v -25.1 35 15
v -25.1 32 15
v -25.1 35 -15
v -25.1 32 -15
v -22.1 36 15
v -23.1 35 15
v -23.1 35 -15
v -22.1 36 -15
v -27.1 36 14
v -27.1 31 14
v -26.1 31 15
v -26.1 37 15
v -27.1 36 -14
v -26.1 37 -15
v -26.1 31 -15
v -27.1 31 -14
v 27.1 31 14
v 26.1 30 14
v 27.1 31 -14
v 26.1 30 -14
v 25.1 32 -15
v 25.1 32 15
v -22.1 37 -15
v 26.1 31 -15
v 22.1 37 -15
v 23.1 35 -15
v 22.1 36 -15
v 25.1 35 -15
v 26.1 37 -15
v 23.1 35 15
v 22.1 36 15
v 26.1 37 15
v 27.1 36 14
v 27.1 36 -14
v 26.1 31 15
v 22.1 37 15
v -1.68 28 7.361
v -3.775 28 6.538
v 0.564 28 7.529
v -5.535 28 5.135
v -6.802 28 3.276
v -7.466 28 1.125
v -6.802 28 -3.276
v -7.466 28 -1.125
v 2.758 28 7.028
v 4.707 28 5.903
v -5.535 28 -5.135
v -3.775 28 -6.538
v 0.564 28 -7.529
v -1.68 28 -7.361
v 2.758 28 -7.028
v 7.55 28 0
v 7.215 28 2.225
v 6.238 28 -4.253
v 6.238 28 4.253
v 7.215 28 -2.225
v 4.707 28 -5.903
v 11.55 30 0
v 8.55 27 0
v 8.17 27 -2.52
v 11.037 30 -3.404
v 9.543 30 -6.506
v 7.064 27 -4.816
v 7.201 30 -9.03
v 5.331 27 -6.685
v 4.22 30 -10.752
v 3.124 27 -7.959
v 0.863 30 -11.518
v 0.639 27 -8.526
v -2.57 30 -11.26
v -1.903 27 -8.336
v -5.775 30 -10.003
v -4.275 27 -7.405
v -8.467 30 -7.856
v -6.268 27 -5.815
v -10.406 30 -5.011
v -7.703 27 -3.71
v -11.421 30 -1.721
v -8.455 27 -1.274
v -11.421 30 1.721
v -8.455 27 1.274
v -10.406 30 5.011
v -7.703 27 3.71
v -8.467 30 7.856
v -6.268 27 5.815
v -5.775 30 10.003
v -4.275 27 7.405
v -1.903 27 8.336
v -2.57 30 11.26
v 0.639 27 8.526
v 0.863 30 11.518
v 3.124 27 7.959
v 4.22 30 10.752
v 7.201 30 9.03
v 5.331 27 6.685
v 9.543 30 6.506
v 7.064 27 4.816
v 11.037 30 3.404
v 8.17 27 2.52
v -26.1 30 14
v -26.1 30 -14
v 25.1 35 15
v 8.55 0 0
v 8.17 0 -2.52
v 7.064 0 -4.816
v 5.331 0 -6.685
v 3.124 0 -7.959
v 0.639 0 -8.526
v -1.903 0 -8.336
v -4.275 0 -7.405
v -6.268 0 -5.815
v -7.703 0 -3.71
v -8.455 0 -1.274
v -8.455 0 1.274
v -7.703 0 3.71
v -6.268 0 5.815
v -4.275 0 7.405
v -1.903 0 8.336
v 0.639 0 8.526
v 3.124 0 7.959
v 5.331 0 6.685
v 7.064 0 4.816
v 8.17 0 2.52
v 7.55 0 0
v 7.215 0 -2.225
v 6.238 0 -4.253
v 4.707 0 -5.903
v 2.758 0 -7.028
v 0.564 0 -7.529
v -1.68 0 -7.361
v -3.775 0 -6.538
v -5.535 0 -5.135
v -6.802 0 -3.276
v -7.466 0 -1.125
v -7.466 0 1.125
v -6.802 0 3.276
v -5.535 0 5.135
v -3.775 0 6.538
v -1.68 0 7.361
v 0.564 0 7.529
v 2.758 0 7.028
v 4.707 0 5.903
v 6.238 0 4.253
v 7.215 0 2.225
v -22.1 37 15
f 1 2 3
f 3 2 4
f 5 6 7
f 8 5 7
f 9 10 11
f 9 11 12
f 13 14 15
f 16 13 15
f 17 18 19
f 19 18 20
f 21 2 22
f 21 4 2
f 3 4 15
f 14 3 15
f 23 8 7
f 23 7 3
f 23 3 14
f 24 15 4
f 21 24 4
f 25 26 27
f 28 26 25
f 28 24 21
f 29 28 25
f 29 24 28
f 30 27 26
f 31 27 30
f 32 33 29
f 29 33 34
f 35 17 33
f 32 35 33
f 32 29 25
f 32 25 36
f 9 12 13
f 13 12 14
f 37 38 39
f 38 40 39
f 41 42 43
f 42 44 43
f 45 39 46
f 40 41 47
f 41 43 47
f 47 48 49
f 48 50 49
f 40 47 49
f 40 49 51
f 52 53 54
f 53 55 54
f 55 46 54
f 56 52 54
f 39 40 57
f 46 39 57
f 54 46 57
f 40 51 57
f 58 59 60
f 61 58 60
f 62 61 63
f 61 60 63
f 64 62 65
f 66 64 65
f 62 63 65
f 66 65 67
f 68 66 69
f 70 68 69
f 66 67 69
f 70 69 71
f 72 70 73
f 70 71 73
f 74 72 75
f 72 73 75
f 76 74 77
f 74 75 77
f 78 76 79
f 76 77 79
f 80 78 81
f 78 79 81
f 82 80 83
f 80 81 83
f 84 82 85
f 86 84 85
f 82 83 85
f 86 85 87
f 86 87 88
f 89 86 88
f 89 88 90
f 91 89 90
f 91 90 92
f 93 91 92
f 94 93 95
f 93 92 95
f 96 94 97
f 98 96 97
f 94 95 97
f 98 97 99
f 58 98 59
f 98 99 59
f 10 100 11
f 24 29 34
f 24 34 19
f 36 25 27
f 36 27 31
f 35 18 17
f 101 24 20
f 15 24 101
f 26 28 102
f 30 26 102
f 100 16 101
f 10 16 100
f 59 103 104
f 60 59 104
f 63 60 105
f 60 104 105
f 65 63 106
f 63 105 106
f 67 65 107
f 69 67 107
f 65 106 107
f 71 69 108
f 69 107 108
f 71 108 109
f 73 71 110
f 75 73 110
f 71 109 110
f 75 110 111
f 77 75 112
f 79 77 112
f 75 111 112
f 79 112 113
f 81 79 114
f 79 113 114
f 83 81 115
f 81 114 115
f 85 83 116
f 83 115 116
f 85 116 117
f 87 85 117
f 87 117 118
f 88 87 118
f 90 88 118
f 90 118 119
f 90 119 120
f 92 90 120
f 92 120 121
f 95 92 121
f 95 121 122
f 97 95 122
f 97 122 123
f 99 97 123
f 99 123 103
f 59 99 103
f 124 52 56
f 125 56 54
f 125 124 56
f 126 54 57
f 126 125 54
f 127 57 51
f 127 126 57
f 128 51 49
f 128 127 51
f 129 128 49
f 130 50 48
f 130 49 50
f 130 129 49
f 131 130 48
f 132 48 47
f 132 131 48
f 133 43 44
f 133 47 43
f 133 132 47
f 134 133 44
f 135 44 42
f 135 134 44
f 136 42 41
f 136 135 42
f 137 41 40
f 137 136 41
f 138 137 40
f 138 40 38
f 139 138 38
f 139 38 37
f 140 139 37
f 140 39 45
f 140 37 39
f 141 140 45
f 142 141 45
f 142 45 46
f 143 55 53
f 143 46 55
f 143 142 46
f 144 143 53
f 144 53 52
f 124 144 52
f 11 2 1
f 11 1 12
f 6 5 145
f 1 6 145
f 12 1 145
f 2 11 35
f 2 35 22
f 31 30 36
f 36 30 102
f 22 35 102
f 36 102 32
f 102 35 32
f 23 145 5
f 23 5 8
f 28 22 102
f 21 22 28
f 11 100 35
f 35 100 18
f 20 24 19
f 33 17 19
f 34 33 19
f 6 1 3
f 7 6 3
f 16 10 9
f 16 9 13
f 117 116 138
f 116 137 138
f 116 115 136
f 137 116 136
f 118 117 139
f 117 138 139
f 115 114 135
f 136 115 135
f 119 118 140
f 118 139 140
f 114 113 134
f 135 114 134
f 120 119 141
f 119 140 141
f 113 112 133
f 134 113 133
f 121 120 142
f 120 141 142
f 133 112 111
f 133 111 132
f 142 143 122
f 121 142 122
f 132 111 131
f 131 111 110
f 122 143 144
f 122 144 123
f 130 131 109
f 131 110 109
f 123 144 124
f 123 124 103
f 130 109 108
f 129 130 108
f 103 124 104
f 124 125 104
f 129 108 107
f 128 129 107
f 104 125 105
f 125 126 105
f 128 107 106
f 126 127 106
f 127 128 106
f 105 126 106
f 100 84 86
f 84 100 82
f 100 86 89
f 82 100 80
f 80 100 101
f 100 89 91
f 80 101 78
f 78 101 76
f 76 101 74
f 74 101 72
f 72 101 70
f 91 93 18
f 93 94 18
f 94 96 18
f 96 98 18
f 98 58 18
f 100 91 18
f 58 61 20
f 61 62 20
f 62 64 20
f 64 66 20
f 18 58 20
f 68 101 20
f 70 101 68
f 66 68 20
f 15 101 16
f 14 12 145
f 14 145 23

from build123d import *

# Parameters (mm, degrees)
SKETCH1_R           = 8.55
SKETCH1_R_2         = 7.55
BOSS_EXTRUDE1_DEPTH = 30
SKETCH2_R           = 8.55
BOSS_EXTRUDE2_DEPTH = 2
BOSS_EXTRUDE3_DEPTH = 2
SKETCH4_W           = 2
SKETCH4_H           = 30
BOSS_EXTRUDE4_DEPTH = 5
SKETCH6_W           = 30
SKETCH6_H           = 2
BOSS_EXTRUDE5_DEPTH = 3
SKETCH7_W           = 30
SKETCH7_H           = 2
BOSS_EXTRUDE6_DEPTH = 3
CHAMFER1_SIZE       = 3
CHAMFER2_SIZE       = 1
CHAMFER3_SIZE       = 1


with BuildPart() as part:
    # Sketch1 → Boss-Extrude1 (new body)
    with BuildSketch(Plane(origin=(0, 0, 0), x_dir=(1, 0, 0), z_dir=(0, 1, 0))):
        Circle(SKETCH1_R)
        Circle(SKETCH1_R_2, mode=Mode.SUBTRACT)
    extrude(amount=BOSS_EXTRUDE1_DEPTH)

    # Sketch2 → Boss-Extrude2 (add)
    with BuildSketch(Plane(origin=(0, 30, 0), x_dir=(1, 0, 0), z_dir=(0, 1, 0))):
        Circle(SKETCH2_R)
    extrude(amount=-BOSS_EXTRUDE2_DEPTH)

    # Sketch3 → Boss-Extrude3 (add)
    with BuildSketch(Plane(origin=(0, 30, 0), x_dir=(1, 0, 0), z_dir=(0, 1, 0))):
        Polygon((27.1, -15), (27.1, 15), (25, 15), (-25, 15), (-27.1, 15), (-27.1, -15), (-25, -15), (25, -15), align=None)
    extrude(amount=BOSS_EXTRUDE3_DEPTH)

    # Sketch4 → Boss-Extrude4 (add)
    with BuildSketch(Plane(origin=(0, 32, 0), x_dir=(1, 0, 0), z_dir=(0, 1, 0))):
        with Locations((-26.1, 0)):
            Rectangle(SKETCH4_W, SKETCH4_H)
        with Locations((26.1, 0)):
            Rectangle(SKETCH4_W, SKETCH4_H)
    extrude(amount=BOSS_EXTRUDE4_DEPTH)

    # Sketch6 → Boss-Extrude5 (add)
    with BuildSketch(Plane(origin=(-25.1, 0, 0), x_dir=(0, 0, -1), z_dir=(1, 0, 0))):
        with Locations((0, 36)):
            Rectangle(SKETCH6_W, SKETCH6_H)
    extrude(amount=BOSS_EXTRUDE5_DEPTH)

    # Sketch7 → Boss-Extrude6 (add)
    with BuildSketch(Plane.ZY.offset(-25.1)):
        with Locations((0, 36)):
            Rectangle(SKETCH7_W, SKETCH7_H)
    extrude(amount=BOSS_EXTRUDE6_DEPTH)

    # Chamfer1
    chamfer1_edges = [part.edges().sort_by_distance(p)[0] for p in [
        (-8.55, 30, 0),
    ]]
    chamfer(chamfer1_edges, length=CHAMFER1_SIZE)

    # Chamfer2
    chamfer2_edges = [part.edges().sort_by_distance(p)[0] for p in [
        (-22.1, 35, 0),
        (22.1, 35, 0),
    ]]
    chamfer(chamfer2_edges, length=CHAMFER2_SIZE)

    # Chamfer3
    chamfer3_edges = [part.edges().sort_by_distance(p)[0] for p in [
        (0, 30, -15),
        (27.1, 33.5, -15),
        (-27.1, 30, 0),
        (-27.1, 33.5, -15),
        (0, 30, 15),
        (-27.1, 33.5, 15),
        (27.1, 30, 0),
        (27.1, 33.5, 15),
        (-27.1, 37, 0),
        (27.1, 37, 0),
    ]]
    chamfer(chamfer3_edges, length=CHAMFER3_SIZE)


solid = part.part
